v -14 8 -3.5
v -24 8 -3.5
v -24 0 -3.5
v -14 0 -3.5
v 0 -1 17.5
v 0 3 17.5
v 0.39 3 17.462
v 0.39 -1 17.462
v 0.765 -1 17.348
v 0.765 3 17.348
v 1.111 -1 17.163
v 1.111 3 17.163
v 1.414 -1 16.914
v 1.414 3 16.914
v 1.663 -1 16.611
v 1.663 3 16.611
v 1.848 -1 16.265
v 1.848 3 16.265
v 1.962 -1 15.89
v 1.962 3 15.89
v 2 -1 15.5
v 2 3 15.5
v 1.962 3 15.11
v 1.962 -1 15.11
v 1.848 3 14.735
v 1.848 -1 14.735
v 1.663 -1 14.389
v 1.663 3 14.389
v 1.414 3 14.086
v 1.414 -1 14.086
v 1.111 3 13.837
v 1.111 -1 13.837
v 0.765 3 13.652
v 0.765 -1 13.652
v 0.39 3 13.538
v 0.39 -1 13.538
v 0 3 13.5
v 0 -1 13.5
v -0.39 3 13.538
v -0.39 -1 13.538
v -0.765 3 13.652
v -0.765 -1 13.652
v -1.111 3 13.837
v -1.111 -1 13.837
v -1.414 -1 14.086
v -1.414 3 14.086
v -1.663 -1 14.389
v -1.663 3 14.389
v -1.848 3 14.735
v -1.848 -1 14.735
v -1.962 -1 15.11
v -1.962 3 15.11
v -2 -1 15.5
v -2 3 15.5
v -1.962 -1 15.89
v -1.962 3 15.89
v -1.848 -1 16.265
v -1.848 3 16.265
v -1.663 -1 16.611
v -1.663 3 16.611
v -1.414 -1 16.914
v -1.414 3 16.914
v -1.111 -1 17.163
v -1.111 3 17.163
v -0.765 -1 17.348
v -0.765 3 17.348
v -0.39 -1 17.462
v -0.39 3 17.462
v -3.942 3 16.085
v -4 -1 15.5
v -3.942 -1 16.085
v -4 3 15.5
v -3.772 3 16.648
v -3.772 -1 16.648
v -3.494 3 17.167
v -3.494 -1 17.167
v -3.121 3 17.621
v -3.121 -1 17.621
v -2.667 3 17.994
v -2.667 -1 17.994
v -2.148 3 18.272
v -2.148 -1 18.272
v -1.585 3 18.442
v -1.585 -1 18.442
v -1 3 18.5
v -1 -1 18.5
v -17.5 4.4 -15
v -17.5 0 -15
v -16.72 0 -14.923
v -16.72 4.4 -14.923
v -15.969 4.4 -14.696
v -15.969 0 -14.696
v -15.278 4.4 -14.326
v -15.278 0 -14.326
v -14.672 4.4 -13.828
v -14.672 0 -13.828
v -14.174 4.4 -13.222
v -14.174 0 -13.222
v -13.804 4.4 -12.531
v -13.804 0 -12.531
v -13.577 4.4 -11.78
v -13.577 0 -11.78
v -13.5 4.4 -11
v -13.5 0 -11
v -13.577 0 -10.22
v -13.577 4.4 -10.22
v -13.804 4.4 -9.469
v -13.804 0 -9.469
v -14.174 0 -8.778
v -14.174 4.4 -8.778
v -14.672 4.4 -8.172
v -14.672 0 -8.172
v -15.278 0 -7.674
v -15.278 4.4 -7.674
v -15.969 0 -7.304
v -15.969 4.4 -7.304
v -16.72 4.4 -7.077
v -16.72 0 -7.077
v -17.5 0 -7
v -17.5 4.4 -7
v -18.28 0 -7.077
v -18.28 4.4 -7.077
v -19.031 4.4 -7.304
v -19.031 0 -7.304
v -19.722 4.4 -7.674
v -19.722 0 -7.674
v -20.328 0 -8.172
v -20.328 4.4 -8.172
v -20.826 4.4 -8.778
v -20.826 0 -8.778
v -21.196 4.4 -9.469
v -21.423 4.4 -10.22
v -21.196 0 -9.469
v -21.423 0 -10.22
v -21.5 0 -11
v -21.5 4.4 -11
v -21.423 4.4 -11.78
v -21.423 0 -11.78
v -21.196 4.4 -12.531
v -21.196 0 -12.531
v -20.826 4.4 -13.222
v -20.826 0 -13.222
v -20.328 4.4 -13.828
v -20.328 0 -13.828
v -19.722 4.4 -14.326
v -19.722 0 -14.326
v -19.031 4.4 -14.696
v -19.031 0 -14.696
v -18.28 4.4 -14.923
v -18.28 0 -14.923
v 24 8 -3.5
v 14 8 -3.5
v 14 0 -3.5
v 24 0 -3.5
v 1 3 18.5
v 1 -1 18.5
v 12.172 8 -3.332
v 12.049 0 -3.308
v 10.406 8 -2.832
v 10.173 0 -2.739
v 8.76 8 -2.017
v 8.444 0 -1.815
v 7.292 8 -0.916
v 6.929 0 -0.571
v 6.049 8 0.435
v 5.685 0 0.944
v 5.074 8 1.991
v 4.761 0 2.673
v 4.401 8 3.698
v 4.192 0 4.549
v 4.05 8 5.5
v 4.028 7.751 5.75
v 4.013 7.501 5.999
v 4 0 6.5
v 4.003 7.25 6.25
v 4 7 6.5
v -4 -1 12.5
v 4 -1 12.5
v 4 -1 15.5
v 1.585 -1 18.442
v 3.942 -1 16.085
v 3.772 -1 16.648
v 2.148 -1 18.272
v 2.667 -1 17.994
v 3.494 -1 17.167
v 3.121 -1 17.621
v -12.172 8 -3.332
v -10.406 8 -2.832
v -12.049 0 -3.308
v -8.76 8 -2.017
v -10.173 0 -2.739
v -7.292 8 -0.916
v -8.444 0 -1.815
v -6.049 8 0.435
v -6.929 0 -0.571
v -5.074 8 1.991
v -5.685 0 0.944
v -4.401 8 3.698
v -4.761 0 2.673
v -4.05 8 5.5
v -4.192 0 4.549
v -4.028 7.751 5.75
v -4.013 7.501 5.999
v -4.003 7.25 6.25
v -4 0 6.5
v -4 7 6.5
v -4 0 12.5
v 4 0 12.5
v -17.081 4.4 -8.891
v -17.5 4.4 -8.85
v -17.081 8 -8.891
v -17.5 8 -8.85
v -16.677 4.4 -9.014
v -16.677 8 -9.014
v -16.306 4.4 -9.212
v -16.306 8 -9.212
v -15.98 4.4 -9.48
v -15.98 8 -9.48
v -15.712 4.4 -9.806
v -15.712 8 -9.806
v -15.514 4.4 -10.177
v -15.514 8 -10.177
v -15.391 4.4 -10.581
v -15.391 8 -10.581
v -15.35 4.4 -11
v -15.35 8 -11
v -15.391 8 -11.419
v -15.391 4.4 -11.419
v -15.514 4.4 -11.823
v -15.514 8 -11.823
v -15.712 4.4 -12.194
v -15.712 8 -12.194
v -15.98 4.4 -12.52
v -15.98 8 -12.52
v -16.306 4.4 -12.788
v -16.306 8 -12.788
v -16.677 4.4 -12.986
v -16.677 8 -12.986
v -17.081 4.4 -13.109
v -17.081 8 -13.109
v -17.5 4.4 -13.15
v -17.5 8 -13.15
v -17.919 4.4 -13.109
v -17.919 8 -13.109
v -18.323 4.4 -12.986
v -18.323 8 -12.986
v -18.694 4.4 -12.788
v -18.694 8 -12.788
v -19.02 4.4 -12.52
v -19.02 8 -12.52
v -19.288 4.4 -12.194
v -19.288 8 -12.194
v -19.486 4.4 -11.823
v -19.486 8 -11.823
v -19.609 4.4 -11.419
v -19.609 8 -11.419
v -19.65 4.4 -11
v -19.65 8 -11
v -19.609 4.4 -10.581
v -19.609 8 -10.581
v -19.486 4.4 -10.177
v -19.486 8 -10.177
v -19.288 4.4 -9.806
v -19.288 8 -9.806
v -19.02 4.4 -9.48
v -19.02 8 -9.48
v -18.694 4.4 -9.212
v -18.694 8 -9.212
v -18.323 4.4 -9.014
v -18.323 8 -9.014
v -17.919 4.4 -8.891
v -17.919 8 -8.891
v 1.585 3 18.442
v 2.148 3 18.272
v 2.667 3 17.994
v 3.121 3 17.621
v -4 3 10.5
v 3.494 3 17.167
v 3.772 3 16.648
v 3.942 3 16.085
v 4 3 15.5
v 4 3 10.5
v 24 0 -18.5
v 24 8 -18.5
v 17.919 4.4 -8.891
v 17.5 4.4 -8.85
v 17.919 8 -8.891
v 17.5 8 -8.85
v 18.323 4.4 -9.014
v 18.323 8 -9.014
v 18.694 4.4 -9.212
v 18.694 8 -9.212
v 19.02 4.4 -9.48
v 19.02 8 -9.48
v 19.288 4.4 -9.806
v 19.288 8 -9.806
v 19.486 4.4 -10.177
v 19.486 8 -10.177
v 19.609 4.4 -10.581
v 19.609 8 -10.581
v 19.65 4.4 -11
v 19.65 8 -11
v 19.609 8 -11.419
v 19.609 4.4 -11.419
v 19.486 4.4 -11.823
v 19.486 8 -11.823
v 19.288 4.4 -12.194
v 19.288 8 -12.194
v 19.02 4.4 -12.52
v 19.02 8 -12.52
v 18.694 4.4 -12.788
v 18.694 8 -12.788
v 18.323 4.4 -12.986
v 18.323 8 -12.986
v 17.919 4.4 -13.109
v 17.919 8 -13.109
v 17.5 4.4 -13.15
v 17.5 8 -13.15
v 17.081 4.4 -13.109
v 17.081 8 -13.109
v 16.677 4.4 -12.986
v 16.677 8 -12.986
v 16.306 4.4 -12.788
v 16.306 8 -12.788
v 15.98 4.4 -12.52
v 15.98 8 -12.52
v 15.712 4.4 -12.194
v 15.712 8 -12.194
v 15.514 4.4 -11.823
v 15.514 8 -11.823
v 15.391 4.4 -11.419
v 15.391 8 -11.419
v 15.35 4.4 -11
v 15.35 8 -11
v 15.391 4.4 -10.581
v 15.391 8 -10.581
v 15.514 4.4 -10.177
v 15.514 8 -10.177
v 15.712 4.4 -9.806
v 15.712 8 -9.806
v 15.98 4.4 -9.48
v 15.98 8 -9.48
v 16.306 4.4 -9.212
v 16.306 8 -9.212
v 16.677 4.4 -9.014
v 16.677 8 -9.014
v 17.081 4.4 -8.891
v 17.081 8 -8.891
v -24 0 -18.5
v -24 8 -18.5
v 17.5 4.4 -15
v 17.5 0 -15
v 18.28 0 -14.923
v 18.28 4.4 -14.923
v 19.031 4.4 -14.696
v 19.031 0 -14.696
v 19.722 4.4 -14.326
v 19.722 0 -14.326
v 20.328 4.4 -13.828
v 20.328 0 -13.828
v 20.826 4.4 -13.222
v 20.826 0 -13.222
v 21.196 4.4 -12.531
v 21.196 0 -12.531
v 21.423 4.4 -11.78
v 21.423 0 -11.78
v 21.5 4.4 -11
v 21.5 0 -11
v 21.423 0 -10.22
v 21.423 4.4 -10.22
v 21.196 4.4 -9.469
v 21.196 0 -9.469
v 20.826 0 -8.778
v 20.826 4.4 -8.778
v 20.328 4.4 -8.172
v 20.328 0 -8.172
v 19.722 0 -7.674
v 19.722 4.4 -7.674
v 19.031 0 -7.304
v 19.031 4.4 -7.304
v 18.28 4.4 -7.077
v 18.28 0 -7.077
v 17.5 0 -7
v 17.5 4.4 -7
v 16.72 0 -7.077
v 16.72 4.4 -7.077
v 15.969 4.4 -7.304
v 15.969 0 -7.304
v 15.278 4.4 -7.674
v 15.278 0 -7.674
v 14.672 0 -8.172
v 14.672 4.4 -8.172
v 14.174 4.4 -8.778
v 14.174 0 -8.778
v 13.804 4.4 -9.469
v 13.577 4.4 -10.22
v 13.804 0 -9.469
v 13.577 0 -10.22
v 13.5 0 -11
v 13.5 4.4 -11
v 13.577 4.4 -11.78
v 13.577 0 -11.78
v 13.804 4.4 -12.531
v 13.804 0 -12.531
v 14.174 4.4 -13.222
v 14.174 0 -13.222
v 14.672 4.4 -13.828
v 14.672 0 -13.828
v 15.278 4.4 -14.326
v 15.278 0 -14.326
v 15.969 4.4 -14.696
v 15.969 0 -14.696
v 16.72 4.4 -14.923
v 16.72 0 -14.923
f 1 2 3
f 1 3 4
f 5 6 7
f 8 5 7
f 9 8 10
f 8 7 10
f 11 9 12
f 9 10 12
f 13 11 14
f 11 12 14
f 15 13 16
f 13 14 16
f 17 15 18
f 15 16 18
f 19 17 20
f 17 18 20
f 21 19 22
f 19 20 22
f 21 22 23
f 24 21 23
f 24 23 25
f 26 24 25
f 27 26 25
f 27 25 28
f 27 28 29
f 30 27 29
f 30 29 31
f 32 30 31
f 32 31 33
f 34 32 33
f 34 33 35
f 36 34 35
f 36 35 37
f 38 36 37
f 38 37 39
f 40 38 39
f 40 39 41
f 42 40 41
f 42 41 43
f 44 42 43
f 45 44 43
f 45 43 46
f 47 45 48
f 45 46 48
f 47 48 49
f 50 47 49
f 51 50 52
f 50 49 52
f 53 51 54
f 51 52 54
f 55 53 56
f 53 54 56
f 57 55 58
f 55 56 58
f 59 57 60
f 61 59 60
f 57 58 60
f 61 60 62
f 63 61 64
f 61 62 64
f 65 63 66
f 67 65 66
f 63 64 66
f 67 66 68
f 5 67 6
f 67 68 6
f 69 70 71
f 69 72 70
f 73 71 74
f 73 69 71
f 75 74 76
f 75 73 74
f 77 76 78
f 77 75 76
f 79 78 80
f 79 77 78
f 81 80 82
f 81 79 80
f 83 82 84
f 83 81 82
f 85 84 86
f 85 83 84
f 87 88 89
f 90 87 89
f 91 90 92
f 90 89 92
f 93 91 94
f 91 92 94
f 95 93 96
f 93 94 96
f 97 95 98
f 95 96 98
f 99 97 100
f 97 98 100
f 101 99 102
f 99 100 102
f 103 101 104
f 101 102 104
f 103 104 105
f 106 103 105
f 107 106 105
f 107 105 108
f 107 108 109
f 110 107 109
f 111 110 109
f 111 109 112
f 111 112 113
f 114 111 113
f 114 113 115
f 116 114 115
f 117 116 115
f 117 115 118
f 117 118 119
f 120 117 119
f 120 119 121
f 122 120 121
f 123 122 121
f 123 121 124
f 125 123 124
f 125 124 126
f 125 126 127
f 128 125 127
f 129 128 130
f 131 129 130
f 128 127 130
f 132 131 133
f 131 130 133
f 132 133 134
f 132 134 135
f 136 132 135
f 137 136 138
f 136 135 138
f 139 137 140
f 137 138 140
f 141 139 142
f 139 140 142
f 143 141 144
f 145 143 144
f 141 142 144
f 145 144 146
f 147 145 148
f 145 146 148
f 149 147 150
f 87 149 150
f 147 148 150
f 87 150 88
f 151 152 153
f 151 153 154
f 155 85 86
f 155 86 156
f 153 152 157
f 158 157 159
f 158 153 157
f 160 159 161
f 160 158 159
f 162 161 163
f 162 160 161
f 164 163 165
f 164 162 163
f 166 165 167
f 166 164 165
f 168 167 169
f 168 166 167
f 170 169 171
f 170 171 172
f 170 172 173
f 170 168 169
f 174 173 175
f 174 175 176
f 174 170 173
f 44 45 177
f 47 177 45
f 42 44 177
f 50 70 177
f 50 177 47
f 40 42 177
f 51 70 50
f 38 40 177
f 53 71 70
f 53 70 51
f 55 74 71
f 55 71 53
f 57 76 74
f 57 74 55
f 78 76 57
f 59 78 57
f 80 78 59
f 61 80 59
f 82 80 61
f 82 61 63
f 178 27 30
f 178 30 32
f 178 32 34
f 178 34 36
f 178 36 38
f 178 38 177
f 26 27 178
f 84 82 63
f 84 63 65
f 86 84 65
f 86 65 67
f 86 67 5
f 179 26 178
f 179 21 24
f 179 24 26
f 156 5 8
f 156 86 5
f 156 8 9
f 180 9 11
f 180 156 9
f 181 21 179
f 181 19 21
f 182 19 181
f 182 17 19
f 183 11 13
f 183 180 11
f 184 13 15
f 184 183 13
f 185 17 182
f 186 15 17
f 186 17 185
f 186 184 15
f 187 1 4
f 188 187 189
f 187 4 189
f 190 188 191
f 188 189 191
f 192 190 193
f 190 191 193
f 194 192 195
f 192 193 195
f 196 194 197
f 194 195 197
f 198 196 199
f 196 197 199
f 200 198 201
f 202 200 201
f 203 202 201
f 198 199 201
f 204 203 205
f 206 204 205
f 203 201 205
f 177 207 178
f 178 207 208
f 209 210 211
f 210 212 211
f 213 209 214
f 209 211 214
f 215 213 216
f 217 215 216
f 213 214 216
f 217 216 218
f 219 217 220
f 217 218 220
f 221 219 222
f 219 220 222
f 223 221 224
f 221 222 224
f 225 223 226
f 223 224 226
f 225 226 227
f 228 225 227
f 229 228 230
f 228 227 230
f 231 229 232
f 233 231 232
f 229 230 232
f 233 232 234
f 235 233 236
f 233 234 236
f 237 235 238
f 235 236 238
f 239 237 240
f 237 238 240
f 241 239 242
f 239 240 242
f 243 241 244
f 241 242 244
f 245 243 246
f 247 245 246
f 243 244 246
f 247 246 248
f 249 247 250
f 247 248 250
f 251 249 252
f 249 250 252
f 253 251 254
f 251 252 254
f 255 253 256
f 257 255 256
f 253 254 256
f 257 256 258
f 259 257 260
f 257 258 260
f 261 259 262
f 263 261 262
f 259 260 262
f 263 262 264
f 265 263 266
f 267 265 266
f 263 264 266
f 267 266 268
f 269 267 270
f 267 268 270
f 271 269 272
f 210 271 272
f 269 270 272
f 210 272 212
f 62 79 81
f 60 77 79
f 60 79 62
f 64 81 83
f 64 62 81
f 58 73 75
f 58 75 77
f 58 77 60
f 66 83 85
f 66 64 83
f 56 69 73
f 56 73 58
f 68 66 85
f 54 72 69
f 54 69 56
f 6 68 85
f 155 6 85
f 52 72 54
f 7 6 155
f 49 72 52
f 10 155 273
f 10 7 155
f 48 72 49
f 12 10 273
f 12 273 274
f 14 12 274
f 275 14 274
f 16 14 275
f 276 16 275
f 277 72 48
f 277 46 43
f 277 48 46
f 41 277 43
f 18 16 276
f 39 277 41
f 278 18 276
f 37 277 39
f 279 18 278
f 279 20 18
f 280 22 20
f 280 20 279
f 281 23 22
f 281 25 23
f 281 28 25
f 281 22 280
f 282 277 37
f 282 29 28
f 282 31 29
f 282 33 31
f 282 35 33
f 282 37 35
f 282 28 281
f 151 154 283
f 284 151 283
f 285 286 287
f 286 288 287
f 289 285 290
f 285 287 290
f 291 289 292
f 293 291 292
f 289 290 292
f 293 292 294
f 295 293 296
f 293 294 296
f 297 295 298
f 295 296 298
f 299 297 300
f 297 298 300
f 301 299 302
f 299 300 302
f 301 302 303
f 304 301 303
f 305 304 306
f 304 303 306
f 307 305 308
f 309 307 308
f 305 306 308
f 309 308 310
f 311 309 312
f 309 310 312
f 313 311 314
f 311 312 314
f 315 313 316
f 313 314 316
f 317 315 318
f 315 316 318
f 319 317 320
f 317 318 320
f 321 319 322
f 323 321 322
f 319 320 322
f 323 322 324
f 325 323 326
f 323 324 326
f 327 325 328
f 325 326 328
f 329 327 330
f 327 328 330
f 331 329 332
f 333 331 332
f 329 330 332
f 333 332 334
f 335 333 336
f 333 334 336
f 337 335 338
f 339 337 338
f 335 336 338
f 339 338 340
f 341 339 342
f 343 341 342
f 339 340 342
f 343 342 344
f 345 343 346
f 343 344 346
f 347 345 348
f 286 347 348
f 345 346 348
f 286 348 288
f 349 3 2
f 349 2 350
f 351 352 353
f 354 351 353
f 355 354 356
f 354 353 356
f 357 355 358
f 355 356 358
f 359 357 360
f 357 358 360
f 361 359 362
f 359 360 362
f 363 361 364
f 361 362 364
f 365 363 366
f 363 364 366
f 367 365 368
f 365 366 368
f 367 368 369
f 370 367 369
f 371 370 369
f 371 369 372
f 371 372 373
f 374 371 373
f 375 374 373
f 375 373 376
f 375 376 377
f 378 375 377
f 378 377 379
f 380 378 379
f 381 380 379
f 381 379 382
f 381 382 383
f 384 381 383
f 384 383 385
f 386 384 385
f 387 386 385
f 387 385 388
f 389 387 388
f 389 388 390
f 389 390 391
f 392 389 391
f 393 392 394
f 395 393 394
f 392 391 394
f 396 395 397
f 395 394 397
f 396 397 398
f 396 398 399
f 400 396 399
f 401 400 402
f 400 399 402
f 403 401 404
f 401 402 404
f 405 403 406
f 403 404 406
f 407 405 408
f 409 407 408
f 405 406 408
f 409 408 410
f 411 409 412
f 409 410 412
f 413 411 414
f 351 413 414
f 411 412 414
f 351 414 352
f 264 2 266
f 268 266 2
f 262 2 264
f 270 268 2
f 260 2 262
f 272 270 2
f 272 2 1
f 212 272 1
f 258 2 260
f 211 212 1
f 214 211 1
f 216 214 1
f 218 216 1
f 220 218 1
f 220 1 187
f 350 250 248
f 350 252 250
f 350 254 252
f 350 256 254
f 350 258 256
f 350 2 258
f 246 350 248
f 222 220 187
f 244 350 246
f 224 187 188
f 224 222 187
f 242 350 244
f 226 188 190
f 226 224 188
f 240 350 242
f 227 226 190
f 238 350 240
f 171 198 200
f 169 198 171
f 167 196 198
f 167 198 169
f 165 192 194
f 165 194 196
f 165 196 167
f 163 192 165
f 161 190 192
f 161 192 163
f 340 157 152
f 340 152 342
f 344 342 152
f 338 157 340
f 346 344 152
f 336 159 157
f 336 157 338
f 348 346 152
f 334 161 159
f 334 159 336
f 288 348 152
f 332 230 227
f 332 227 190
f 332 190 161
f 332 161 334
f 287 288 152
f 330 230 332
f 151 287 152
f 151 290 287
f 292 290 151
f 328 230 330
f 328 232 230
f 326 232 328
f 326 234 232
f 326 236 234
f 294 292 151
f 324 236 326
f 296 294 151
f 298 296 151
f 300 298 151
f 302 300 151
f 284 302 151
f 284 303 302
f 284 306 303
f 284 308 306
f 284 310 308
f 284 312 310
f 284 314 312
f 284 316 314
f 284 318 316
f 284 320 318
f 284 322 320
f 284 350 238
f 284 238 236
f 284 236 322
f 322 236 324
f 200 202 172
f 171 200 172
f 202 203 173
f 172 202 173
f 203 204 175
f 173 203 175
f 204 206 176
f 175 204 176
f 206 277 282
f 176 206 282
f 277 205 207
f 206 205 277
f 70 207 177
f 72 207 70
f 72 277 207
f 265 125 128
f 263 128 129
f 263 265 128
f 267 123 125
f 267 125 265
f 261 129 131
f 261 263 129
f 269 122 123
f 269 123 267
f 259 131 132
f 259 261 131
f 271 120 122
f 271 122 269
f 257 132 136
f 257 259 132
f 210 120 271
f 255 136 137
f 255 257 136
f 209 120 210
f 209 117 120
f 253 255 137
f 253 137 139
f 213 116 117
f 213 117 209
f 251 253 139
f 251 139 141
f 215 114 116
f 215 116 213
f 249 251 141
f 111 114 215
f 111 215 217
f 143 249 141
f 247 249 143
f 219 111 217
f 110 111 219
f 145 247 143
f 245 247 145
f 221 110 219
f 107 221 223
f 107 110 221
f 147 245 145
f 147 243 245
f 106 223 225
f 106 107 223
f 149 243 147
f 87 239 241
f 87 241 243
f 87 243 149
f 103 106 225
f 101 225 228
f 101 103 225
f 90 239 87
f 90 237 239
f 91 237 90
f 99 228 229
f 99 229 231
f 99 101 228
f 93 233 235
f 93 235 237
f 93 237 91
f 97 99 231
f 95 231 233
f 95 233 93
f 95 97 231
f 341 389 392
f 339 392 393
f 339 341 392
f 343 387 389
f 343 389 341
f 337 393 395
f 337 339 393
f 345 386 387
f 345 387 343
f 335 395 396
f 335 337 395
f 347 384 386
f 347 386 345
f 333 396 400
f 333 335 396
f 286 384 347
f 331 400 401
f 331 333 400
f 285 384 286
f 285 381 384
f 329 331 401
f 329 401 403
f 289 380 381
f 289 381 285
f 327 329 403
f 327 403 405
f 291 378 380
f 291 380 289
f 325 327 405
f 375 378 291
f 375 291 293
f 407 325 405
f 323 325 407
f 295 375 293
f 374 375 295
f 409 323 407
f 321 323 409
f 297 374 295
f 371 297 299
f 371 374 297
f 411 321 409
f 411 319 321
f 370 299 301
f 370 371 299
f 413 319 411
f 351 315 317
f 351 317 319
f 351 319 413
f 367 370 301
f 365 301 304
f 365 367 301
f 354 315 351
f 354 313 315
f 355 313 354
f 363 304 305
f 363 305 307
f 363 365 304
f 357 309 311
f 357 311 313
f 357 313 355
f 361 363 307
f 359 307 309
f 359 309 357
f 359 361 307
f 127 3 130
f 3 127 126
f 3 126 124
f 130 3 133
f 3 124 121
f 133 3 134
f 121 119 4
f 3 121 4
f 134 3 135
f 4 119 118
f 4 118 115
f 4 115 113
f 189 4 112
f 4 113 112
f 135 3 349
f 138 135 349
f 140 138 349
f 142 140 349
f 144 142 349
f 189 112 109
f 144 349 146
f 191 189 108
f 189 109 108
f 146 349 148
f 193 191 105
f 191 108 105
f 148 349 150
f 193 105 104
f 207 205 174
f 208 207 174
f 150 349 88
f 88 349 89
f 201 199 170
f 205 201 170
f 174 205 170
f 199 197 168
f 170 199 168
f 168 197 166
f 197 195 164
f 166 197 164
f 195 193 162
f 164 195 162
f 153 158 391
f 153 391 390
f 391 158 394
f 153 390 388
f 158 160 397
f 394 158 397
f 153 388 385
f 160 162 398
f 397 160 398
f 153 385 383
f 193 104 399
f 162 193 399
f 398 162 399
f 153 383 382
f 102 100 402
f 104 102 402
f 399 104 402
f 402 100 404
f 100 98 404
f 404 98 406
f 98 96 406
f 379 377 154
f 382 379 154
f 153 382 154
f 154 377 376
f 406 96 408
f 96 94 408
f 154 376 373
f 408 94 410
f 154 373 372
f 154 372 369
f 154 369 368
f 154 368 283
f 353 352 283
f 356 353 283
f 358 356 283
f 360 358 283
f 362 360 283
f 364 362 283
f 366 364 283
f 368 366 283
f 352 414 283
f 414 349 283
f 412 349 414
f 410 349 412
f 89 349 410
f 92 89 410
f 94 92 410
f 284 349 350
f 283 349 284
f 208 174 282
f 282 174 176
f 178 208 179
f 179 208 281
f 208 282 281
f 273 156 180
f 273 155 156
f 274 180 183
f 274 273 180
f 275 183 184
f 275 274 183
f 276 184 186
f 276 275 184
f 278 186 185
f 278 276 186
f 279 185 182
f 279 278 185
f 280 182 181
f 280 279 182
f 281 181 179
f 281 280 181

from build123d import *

# Parameters (mm, degrees)
SKETCH_1_W                   = 48
SKETCH_1_H                   = 37
EXTRUDE_1_DEPTH              = 8
SKETCH_2_W                   = 20
SKETCH_2_H                   = 22
CUT_EXTRUDE_1_DEPTH          = 32.340867888
FILLET_1_R                   = 10
SKETCH_3_W                   = 8
SKETCH_3_H                   = 6
EXTRUDE_2_DEPTH              = 1
SKETCH_4_R                   = 2
CUT_EXTRUDE_2_DEPTH          = 32.610915836
HOLE_WIZARD_M4_1_D           = 4.3
HOLE_WIZARD_M4_1_CBORE_D     = 8
HOLE_WIZARD_M4_1_CBORE_DEPTH = 4.4
SKETCH_7_W                   = 8
SKETCH_7_H                   = 8
CUT_EXTRUDE_3_DEPTH          = 5
CHAMFER_1_SIZE               = 5
FILLET_2_R                   = 3


with BuildPart() as part:
    # 草图1 → 凸台-拉伸1 (new body)
    with BuildSketch(Plane(origin=(0, 0, 0), x_dir=(1, 0, 0), z_dir=(0, 1, 0))):
        Rectangle(SKETCH_1_W, SKETCH_1_H)
    extrude(amount=EXTRUDE_1_DEPTH)

    # 草图2 → 切除-拉伸1 (cut, through all)
    with BuildSketch(Plane(origin=(0, 8, 0), x_dir=(1, 0, 0), z_dir=(0, 1, 0))):
        with Locations((-14, -7.5)):
            Rectangle(SKETCH_2_W, SKETCH_2_H)
        with Locations((14, -7.5)):
            Rectangle(SKETCH_2_W, SKETCH_2_H)
    extrude(amount=-CUT_EXTRUDE_1_DEPTH, mode=Mode.SUBTRACT)

    # 圆角1
    fillet_1_edges = [part.edges().sort_by_distance(p)[0] for p in [
        (-4, 4, -3.5),
        (4, 4, -3.5),
    ]]
    fillet(fillet_1_edges, radius=FILLET_1_R)

    # 草图3 → 凸台-拉伸2 (add)
    with BuildSketch(Plane.XZ):
        with Locations((0, 15.5)):
            Rectangle(SKETCH_3_W, SKETCH_3_H)
    extrude(amount=EXTRUDE_2_DEPTH)

    # 草图4 → 切除-拉伸2 (cut, through all)
    with BuildSketch(Plane(origin=(0, 8, 0), x_dir=(1, 0, 0), z_dir=(0, 1, 0))):
        with Locations(Location((0, -15.5, 0), (0, 0, 270))):
            Circle(SKETCH_4_R)
    extrude(amount=-CUT_EXTRUDE_2_DEPTH, mode=Mode.SUBTRACT)

    # M4 六角凹头螺钉的柱形沉头孔1 (through all)
    with Locations(Plane(origin=(17.5, 0, -11), x_dir=(0, 0, -1), z_dir=(0, -1, 0))):
        with Locations((0, 0), (0, -35)):
            CounterBoreHole(HOLE_WIZARD_M4_1_D / 2, HOLE_WIZARD_M4_1_CBORE_D / 2, HOLE_WIZARD_M4_1_CBORE_DEPTH)

    # 草图7 → 切除-拉伸3 (cut)
    with BuildSketch(Plane(origin=(0, 8, 0), x_dir=(1, 0, 0), z_dir=(0, 1, 0))):
        with Locations((0, -14.5)):
            Rectangle(SKETCH_7_W, SKETCH_7_H)
    extrude(amount=-CUT_EXTRUDE_3_DEPTH, mode=Mode.SUBTRACT)

    # 倒角1
    chamfer_1_edges = [part.edges().sort_by_distance(p)[0] for p in [
        (0, 8, 10.5),
    ]]
    chamfer(chamfer_1_edges, length=CHAMFER_1_SIZE - 0.0001)  # a hair under: the kernel refuses the full size

    # 圆角2
    fillet_2_edges = [part.edges().sort_by_distance(p)[0] for p in [
        (-4, 1, 18.5),
        (4, 1, 18.5),
    ]]
    fillet(fillet_2_edges, radius=FILLET_2_R)


solid = part.part
